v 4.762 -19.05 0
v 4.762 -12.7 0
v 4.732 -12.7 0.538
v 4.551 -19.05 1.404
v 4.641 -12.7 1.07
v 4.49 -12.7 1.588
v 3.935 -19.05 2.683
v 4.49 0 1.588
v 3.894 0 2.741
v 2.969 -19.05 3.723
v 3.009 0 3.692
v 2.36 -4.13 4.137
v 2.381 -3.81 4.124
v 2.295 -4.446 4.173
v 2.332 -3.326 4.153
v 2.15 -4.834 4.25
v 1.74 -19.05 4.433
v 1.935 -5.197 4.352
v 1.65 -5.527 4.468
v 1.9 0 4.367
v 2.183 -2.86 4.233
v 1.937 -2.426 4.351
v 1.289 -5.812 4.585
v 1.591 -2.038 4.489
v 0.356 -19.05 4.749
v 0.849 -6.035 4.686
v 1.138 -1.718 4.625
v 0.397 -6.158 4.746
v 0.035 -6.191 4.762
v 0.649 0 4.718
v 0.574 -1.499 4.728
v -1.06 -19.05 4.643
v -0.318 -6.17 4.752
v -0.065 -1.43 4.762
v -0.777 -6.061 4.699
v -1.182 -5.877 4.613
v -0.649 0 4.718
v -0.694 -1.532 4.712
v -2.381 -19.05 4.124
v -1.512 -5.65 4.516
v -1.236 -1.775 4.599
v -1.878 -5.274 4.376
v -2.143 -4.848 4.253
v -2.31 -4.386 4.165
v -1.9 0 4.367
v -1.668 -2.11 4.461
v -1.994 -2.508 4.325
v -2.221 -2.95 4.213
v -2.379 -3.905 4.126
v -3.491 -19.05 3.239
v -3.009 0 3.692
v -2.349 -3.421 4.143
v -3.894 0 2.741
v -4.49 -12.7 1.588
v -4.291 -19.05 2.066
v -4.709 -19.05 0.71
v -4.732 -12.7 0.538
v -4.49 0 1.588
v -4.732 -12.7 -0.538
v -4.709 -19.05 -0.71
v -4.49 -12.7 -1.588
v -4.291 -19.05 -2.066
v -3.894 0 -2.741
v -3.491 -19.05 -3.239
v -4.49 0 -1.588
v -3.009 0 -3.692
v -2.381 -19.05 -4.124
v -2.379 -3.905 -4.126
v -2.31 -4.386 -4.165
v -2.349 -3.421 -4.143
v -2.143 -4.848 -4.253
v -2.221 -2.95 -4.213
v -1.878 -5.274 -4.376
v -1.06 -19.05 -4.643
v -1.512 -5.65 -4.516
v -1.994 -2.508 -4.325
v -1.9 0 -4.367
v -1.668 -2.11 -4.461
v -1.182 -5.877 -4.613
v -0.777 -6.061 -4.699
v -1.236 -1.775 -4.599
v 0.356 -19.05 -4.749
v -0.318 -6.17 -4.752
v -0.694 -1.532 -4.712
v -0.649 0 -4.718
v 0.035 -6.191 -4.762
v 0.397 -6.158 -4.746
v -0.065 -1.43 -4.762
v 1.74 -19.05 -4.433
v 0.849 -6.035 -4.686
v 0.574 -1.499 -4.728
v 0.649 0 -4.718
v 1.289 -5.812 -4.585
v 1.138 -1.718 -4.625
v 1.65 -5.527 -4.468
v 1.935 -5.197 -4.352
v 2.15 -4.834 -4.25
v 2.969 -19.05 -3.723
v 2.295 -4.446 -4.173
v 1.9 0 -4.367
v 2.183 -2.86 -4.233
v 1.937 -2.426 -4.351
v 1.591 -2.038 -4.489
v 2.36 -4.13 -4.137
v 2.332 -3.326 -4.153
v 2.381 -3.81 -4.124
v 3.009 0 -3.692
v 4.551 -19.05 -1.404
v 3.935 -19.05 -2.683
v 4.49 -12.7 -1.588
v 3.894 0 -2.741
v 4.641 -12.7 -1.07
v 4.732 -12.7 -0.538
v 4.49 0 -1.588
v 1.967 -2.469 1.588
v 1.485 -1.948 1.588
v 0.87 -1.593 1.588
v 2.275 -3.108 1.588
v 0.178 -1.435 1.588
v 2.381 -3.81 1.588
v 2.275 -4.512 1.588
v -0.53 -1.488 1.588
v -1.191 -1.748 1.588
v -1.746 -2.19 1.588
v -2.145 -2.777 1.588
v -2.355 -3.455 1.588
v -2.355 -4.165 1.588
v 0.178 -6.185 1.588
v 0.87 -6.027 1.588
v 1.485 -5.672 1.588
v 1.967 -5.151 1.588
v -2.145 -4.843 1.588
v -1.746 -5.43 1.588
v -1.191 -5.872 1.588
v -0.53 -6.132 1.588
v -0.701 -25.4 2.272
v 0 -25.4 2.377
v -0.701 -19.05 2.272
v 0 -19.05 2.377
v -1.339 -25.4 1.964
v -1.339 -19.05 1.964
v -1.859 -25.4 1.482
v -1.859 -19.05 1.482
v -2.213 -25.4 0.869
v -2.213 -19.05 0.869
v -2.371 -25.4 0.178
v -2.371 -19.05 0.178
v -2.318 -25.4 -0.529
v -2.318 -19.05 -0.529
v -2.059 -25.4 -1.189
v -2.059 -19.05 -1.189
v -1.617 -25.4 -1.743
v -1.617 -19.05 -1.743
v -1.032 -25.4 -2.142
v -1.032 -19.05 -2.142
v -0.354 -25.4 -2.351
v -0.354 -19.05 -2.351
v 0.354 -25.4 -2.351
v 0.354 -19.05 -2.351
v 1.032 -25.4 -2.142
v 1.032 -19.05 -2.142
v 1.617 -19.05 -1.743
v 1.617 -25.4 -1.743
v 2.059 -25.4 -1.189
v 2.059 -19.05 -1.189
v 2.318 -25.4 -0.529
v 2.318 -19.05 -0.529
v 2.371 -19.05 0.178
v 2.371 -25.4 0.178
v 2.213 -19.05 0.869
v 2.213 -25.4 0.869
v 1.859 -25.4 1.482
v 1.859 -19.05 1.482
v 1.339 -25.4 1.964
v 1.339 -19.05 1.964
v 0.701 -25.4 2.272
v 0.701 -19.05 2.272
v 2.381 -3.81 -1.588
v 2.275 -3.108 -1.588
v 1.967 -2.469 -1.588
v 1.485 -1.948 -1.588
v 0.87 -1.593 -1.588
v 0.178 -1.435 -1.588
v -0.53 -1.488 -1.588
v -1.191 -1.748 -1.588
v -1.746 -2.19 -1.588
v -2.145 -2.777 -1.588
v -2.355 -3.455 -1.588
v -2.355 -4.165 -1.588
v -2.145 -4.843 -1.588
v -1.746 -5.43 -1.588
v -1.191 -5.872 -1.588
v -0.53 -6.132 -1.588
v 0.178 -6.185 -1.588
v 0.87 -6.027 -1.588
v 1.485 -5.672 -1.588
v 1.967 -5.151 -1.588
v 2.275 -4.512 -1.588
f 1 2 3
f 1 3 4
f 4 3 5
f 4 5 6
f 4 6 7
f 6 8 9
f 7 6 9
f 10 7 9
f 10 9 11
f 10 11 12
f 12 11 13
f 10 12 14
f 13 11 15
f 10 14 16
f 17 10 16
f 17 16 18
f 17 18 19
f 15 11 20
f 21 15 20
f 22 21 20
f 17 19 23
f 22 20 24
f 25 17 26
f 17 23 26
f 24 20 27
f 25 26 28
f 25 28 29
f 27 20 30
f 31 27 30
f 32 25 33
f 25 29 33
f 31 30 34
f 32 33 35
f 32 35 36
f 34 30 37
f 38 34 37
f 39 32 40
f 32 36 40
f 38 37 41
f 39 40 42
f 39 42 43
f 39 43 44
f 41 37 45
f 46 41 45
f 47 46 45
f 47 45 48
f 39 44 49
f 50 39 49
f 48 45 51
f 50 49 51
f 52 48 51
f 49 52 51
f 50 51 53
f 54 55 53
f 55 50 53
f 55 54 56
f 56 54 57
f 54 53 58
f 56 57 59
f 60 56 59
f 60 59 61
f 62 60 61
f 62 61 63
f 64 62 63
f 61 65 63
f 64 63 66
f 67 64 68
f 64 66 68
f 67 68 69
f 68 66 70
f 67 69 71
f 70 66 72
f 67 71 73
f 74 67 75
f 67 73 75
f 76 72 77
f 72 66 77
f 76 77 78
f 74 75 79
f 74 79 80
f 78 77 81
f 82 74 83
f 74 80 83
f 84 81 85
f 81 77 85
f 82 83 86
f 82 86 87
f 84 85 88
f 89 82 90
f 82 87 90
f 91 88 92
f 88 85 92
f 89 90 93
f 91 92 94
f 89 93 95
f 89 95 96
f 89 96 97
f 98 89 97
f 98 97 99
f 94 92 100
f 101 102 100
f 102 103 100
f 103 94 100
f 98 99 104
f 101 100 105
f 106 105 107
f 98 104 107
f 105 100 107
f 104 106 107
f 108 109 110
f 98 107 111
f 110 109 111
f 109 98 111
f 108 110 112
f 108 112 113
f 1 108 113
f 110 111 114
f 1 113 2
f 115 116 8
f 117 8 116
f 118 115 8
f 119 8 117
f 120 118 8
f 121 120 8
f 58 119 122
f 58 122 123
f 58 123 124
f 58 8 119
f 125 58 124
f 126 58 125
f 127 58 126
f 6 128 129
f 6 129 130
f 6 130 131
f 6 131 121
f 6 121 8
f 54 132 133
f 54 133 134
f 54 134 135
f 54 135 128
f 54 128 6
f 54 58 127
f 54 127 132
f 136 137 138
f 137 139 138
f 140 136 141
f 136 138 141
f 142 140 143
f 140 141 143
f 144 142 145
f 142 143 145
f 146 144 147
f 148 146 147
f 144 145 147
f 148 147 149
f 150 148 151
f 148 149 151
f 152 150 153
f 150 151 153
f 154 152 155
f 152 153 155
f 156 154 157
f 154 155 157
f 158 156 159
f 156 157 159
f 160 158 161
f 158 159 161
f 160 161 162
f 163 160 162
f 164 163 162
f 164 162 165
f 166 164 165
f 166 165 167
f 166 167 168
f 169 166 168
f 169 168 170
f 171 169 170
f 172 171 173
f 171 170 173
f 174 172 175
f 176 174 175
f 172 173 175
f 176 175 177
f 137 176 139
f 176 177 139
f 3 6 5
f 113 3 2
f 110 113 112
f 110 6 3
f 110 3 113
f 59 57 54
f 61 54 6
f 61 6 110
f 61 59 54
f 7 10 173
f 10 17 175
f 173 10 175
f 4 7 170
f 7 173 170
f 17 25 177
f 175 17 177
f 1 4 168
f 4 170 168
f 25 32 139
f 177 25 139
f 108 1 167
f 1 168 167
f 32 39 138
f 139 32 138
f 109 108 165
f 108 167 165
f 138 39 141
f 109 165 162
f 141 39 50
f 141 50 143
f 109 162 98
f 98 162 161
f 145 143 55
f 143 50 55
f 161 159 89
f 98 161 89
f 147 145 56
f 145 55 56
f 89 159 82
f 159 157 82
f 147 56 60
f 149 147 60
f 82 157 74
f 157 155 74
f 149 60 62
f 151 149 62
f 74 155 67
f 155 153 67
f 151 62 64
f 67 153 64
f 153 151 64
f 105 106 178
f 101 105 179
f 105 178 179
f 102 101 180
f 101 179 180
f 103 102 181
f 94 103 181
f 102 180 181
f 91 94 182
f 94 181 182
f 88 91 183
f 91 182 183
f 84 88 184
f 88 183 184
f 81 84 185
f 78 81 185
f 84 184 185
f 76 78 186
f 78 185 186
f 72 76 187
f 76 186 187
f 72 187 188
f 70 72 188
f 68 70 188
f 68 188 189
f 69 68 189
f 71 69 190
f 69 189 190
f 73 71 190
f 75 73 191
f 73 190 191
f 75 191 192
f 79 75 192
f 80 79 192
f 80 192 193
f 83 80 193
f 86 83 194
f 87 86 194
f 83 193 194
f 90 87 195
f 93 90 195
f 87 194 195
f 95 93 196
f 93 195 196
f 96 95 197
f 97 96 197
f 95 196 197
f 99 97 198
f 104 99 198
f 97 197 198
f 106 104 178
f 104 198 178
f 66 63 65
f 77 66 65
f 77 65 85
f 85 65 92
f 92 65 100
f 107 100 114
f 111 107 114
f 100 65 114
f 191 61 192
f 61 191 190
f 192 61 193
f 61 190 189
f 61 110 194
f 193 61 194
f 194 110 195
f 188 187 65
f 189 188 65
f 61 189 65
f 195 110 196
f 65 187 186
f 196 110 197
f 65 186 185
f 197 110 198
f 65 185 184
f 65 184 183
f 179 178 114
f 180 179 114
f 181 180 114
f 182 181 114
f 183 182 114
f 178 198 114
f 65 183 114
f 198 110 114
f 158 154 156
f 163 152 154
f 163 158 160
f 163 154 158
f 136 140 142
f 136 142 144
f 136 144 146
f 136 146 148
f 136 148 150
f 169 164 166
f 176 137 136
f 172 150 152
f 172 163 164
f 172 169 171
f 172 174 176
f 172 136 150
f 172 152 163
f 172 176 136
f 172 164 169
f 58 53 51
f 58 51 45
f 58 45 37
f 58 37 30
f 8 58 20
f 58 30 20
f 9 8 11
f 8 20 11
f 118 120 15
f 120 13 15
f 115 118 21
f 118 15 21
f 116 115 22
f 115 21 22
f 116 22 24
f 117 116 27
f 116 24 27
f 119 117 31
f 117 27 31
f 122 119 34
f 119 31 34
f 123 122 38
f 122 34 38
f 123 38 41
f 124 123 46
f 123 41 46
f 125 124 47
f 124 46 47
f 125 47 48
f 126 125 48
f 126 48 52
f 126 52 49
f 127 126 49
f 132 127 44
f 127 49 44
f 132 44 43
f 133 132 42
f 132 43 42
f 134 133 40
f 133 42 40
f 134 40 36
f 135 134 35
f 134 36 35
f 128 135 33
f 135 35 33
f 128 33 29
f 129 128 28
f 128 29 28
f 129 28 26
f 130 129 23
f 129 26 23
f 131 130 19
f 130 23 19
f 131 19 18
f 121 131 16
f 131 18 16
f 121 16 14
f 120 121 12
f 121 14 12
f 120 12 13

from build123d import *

# Parameters (mm, degrees)
F0_R          = 4.7625
F1_DEPTH      = 25.4
F2_W          = 6.35
F2_H          = 4.7452268491
F5_DEPTH      = 4.7635
F5_DEPTH_BACK = 4.7635
F6_R          = 2.38125
F7_DEPTH      = 12.7


with BuildPart() as f1:
    # F0 (on Front) → F1 (new body)
    with BuildSketch(Plane.XZ):
        Circle(F0_R)
    extrude(amount=F1_DEPTH)

    # F2 (on Right) → F3 (revolve, cut)
    with BuildSketch(Plane.YZ):
        with Locations((-22.225, 4.7500534246)):
            Rectangle(F2_W, F2_H)
    revolve(axis=Axis((0, -25.3480933607, 0), (0, -1, 0)), mode=Mode.SUBTRACT)

    # F4 (on Right) → F5 (cut, two sides)
    with BuildSketch(Plane.YZ) as f5_sk:
        Polygon((0, -1.5875), (0, 0), (0, 1.5875), (-12.7, 1.5875), (-12.7, 0), (-12.7, -1.5875), align=None)
    extrude(amount=-F5_DEPTH, mode=Mode.SUBTRACT)
    extrude(f5_sk.sketch, amount=F5_DEPTH_BACK, mode=Mode.SUBTRACT)

    # F6 (on Top) → F7 (cut, symmetric)
    with BuildSketch(Plane.XY):
        with Locations((0, -3.81)):
            Circle(F6_R)
    extrude(amount=F7_DEPTH, both=True, mode=Mode.SUBTRACT)


solid = f1.part
